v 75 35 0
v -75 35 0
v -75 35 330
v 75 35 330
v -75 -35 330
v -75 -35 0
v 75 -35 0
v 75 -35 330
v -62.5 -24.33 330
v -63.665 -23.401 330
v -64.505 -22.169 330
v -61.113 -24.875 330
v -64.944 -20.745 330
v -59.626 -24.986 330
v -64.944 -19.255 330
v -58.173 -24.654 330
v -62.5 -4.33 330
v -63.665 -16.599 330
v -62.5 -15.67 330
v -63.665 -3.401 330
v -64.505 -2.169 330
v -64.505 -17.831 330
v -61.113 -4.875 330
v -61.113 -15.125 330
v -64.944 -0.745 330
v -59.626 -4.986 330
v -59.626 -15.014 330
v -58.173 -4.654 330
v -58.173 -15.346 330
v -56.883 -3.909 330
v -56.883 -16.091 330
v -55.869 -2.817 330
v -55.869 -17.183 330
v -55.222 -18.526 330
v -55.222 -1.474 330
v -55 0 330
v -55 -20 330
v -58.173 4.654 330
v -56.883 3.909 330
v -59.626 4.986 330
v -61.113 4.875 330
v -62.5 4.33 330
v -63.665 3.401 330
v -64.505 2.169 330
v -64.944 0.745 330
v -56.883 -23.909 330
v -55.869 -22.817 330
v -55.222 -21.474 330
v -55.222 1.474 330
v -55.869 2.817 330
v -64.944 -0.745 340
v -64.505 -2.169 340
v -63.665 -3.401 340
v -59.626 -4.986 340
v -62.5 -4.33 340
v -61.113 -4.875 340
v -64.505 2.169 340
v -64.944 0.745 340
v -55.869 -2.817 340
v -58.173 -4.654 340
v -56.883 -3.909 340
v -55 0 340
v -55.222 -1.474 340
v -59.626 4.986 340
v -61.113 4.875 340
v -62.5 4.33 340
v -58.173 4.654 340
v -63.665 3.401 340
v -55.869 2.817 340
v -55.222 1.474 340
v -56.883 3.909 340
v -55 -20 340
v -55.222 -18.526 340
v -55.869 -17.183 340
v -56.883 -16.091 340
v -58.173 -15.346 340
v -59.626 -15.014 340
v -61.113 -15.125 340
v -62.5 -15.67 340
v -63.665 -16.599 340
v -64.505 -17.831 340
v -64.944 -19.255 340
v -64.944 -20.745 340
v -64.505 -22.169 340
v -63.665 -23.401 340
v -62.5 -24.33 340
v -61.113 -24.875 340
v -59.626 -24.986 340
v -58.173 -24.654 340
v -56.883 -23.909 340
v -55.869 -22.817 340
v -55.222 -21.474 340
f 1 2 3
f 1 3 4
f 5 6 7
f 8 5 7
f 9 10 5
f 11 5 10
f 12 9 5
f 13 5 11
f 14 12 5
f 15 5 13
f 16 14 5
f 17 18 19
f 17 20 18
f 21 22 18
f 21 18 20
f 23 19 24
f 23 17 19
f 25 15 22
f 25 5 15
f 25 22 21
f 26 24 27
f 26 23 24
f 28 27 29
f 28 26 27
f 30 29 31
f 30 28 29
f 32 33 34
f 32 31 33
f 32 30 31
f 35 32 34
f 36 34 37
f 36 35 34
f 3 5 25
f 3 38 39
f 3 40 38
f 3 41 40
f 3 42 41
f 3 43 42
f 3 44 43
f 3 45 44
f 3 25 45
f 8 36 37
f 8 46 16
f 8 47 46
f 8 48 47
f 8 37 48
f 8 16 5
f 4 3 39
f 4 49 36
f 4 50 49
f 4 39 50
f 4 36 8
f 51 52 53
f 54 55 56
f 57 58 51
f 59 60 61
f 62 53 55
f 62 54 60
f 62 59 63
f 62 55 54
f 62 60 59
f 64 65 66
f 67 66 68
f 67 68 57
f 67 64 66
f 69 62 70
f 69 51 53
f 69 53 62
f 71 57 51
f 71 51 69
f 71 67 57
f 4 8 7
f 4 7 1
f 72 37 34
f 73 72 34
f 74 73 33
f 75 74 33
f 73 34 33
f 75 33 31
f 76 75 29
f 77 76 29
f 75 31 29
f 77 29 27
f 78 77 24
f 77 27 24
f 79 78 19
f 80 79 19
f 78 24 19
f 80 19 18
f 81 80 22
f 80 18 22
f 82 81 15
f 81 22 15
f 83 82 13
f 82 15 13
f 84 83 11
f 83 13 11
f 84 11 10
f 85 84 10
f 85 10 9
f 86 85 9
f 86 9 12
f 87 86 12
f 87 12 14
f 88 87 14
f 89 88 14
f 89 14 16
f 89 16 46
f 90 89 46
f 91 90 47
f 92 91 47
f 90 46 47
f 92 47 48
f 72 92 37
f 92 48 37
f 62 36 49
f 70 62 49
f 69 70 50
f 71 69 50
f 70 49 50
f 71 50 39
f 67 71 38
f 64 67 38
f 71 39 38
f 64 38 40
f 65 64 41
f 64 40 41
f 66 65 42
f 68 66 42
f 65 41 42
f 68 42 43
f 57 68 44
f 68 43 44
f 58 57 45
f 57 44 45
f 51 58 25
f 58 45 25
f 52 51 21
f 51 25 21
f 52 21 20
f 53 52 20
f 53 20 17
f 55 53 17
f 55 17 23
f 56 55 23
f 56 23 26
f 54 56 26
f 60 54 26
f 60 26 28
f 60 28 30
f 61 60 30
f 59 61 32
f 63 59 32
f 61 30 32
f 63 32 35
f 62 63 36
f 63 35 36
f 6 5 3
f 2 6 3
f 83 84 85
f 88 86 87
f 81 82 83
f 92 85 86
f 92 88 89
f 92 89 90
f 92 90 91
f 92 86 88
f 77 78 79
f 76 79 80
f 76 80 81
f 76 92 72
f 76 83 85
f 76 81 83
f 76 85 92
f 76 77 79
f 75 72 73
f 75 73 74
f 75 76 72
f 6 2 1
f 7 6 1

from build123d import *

# Parameters (mm, degrees)
SKETCH_1_W      = 150
SKETCH_1_H      = 70
EXTRUDE_1_DEPTH = 330
SKETCH_2_R      = 5
EXTRUDE_2_DEPTH = 10


with BuildPart() as part:
    # 草图1 → 凸台-拉伸1 (new body)
    with BuildSketch(Plane.XY):
        Rectangle(SKETCH_1_W, SKETCH_1_H)
    extrude(amount=EXTRUDE_1_DEPTH)

    # 草图2 → 凸台-拉伸2 (add)
    with BuildSketch(Plane.XY.offset(330)):
        with Locations((-60, 0)):
            Circle(SKETCH_2_R)
        with Locations((-60, -20)):
            Circle(SKETCH_2_R)
    extrude(amount=EXTRUDE_2_DEPTH)


solid = part.part
